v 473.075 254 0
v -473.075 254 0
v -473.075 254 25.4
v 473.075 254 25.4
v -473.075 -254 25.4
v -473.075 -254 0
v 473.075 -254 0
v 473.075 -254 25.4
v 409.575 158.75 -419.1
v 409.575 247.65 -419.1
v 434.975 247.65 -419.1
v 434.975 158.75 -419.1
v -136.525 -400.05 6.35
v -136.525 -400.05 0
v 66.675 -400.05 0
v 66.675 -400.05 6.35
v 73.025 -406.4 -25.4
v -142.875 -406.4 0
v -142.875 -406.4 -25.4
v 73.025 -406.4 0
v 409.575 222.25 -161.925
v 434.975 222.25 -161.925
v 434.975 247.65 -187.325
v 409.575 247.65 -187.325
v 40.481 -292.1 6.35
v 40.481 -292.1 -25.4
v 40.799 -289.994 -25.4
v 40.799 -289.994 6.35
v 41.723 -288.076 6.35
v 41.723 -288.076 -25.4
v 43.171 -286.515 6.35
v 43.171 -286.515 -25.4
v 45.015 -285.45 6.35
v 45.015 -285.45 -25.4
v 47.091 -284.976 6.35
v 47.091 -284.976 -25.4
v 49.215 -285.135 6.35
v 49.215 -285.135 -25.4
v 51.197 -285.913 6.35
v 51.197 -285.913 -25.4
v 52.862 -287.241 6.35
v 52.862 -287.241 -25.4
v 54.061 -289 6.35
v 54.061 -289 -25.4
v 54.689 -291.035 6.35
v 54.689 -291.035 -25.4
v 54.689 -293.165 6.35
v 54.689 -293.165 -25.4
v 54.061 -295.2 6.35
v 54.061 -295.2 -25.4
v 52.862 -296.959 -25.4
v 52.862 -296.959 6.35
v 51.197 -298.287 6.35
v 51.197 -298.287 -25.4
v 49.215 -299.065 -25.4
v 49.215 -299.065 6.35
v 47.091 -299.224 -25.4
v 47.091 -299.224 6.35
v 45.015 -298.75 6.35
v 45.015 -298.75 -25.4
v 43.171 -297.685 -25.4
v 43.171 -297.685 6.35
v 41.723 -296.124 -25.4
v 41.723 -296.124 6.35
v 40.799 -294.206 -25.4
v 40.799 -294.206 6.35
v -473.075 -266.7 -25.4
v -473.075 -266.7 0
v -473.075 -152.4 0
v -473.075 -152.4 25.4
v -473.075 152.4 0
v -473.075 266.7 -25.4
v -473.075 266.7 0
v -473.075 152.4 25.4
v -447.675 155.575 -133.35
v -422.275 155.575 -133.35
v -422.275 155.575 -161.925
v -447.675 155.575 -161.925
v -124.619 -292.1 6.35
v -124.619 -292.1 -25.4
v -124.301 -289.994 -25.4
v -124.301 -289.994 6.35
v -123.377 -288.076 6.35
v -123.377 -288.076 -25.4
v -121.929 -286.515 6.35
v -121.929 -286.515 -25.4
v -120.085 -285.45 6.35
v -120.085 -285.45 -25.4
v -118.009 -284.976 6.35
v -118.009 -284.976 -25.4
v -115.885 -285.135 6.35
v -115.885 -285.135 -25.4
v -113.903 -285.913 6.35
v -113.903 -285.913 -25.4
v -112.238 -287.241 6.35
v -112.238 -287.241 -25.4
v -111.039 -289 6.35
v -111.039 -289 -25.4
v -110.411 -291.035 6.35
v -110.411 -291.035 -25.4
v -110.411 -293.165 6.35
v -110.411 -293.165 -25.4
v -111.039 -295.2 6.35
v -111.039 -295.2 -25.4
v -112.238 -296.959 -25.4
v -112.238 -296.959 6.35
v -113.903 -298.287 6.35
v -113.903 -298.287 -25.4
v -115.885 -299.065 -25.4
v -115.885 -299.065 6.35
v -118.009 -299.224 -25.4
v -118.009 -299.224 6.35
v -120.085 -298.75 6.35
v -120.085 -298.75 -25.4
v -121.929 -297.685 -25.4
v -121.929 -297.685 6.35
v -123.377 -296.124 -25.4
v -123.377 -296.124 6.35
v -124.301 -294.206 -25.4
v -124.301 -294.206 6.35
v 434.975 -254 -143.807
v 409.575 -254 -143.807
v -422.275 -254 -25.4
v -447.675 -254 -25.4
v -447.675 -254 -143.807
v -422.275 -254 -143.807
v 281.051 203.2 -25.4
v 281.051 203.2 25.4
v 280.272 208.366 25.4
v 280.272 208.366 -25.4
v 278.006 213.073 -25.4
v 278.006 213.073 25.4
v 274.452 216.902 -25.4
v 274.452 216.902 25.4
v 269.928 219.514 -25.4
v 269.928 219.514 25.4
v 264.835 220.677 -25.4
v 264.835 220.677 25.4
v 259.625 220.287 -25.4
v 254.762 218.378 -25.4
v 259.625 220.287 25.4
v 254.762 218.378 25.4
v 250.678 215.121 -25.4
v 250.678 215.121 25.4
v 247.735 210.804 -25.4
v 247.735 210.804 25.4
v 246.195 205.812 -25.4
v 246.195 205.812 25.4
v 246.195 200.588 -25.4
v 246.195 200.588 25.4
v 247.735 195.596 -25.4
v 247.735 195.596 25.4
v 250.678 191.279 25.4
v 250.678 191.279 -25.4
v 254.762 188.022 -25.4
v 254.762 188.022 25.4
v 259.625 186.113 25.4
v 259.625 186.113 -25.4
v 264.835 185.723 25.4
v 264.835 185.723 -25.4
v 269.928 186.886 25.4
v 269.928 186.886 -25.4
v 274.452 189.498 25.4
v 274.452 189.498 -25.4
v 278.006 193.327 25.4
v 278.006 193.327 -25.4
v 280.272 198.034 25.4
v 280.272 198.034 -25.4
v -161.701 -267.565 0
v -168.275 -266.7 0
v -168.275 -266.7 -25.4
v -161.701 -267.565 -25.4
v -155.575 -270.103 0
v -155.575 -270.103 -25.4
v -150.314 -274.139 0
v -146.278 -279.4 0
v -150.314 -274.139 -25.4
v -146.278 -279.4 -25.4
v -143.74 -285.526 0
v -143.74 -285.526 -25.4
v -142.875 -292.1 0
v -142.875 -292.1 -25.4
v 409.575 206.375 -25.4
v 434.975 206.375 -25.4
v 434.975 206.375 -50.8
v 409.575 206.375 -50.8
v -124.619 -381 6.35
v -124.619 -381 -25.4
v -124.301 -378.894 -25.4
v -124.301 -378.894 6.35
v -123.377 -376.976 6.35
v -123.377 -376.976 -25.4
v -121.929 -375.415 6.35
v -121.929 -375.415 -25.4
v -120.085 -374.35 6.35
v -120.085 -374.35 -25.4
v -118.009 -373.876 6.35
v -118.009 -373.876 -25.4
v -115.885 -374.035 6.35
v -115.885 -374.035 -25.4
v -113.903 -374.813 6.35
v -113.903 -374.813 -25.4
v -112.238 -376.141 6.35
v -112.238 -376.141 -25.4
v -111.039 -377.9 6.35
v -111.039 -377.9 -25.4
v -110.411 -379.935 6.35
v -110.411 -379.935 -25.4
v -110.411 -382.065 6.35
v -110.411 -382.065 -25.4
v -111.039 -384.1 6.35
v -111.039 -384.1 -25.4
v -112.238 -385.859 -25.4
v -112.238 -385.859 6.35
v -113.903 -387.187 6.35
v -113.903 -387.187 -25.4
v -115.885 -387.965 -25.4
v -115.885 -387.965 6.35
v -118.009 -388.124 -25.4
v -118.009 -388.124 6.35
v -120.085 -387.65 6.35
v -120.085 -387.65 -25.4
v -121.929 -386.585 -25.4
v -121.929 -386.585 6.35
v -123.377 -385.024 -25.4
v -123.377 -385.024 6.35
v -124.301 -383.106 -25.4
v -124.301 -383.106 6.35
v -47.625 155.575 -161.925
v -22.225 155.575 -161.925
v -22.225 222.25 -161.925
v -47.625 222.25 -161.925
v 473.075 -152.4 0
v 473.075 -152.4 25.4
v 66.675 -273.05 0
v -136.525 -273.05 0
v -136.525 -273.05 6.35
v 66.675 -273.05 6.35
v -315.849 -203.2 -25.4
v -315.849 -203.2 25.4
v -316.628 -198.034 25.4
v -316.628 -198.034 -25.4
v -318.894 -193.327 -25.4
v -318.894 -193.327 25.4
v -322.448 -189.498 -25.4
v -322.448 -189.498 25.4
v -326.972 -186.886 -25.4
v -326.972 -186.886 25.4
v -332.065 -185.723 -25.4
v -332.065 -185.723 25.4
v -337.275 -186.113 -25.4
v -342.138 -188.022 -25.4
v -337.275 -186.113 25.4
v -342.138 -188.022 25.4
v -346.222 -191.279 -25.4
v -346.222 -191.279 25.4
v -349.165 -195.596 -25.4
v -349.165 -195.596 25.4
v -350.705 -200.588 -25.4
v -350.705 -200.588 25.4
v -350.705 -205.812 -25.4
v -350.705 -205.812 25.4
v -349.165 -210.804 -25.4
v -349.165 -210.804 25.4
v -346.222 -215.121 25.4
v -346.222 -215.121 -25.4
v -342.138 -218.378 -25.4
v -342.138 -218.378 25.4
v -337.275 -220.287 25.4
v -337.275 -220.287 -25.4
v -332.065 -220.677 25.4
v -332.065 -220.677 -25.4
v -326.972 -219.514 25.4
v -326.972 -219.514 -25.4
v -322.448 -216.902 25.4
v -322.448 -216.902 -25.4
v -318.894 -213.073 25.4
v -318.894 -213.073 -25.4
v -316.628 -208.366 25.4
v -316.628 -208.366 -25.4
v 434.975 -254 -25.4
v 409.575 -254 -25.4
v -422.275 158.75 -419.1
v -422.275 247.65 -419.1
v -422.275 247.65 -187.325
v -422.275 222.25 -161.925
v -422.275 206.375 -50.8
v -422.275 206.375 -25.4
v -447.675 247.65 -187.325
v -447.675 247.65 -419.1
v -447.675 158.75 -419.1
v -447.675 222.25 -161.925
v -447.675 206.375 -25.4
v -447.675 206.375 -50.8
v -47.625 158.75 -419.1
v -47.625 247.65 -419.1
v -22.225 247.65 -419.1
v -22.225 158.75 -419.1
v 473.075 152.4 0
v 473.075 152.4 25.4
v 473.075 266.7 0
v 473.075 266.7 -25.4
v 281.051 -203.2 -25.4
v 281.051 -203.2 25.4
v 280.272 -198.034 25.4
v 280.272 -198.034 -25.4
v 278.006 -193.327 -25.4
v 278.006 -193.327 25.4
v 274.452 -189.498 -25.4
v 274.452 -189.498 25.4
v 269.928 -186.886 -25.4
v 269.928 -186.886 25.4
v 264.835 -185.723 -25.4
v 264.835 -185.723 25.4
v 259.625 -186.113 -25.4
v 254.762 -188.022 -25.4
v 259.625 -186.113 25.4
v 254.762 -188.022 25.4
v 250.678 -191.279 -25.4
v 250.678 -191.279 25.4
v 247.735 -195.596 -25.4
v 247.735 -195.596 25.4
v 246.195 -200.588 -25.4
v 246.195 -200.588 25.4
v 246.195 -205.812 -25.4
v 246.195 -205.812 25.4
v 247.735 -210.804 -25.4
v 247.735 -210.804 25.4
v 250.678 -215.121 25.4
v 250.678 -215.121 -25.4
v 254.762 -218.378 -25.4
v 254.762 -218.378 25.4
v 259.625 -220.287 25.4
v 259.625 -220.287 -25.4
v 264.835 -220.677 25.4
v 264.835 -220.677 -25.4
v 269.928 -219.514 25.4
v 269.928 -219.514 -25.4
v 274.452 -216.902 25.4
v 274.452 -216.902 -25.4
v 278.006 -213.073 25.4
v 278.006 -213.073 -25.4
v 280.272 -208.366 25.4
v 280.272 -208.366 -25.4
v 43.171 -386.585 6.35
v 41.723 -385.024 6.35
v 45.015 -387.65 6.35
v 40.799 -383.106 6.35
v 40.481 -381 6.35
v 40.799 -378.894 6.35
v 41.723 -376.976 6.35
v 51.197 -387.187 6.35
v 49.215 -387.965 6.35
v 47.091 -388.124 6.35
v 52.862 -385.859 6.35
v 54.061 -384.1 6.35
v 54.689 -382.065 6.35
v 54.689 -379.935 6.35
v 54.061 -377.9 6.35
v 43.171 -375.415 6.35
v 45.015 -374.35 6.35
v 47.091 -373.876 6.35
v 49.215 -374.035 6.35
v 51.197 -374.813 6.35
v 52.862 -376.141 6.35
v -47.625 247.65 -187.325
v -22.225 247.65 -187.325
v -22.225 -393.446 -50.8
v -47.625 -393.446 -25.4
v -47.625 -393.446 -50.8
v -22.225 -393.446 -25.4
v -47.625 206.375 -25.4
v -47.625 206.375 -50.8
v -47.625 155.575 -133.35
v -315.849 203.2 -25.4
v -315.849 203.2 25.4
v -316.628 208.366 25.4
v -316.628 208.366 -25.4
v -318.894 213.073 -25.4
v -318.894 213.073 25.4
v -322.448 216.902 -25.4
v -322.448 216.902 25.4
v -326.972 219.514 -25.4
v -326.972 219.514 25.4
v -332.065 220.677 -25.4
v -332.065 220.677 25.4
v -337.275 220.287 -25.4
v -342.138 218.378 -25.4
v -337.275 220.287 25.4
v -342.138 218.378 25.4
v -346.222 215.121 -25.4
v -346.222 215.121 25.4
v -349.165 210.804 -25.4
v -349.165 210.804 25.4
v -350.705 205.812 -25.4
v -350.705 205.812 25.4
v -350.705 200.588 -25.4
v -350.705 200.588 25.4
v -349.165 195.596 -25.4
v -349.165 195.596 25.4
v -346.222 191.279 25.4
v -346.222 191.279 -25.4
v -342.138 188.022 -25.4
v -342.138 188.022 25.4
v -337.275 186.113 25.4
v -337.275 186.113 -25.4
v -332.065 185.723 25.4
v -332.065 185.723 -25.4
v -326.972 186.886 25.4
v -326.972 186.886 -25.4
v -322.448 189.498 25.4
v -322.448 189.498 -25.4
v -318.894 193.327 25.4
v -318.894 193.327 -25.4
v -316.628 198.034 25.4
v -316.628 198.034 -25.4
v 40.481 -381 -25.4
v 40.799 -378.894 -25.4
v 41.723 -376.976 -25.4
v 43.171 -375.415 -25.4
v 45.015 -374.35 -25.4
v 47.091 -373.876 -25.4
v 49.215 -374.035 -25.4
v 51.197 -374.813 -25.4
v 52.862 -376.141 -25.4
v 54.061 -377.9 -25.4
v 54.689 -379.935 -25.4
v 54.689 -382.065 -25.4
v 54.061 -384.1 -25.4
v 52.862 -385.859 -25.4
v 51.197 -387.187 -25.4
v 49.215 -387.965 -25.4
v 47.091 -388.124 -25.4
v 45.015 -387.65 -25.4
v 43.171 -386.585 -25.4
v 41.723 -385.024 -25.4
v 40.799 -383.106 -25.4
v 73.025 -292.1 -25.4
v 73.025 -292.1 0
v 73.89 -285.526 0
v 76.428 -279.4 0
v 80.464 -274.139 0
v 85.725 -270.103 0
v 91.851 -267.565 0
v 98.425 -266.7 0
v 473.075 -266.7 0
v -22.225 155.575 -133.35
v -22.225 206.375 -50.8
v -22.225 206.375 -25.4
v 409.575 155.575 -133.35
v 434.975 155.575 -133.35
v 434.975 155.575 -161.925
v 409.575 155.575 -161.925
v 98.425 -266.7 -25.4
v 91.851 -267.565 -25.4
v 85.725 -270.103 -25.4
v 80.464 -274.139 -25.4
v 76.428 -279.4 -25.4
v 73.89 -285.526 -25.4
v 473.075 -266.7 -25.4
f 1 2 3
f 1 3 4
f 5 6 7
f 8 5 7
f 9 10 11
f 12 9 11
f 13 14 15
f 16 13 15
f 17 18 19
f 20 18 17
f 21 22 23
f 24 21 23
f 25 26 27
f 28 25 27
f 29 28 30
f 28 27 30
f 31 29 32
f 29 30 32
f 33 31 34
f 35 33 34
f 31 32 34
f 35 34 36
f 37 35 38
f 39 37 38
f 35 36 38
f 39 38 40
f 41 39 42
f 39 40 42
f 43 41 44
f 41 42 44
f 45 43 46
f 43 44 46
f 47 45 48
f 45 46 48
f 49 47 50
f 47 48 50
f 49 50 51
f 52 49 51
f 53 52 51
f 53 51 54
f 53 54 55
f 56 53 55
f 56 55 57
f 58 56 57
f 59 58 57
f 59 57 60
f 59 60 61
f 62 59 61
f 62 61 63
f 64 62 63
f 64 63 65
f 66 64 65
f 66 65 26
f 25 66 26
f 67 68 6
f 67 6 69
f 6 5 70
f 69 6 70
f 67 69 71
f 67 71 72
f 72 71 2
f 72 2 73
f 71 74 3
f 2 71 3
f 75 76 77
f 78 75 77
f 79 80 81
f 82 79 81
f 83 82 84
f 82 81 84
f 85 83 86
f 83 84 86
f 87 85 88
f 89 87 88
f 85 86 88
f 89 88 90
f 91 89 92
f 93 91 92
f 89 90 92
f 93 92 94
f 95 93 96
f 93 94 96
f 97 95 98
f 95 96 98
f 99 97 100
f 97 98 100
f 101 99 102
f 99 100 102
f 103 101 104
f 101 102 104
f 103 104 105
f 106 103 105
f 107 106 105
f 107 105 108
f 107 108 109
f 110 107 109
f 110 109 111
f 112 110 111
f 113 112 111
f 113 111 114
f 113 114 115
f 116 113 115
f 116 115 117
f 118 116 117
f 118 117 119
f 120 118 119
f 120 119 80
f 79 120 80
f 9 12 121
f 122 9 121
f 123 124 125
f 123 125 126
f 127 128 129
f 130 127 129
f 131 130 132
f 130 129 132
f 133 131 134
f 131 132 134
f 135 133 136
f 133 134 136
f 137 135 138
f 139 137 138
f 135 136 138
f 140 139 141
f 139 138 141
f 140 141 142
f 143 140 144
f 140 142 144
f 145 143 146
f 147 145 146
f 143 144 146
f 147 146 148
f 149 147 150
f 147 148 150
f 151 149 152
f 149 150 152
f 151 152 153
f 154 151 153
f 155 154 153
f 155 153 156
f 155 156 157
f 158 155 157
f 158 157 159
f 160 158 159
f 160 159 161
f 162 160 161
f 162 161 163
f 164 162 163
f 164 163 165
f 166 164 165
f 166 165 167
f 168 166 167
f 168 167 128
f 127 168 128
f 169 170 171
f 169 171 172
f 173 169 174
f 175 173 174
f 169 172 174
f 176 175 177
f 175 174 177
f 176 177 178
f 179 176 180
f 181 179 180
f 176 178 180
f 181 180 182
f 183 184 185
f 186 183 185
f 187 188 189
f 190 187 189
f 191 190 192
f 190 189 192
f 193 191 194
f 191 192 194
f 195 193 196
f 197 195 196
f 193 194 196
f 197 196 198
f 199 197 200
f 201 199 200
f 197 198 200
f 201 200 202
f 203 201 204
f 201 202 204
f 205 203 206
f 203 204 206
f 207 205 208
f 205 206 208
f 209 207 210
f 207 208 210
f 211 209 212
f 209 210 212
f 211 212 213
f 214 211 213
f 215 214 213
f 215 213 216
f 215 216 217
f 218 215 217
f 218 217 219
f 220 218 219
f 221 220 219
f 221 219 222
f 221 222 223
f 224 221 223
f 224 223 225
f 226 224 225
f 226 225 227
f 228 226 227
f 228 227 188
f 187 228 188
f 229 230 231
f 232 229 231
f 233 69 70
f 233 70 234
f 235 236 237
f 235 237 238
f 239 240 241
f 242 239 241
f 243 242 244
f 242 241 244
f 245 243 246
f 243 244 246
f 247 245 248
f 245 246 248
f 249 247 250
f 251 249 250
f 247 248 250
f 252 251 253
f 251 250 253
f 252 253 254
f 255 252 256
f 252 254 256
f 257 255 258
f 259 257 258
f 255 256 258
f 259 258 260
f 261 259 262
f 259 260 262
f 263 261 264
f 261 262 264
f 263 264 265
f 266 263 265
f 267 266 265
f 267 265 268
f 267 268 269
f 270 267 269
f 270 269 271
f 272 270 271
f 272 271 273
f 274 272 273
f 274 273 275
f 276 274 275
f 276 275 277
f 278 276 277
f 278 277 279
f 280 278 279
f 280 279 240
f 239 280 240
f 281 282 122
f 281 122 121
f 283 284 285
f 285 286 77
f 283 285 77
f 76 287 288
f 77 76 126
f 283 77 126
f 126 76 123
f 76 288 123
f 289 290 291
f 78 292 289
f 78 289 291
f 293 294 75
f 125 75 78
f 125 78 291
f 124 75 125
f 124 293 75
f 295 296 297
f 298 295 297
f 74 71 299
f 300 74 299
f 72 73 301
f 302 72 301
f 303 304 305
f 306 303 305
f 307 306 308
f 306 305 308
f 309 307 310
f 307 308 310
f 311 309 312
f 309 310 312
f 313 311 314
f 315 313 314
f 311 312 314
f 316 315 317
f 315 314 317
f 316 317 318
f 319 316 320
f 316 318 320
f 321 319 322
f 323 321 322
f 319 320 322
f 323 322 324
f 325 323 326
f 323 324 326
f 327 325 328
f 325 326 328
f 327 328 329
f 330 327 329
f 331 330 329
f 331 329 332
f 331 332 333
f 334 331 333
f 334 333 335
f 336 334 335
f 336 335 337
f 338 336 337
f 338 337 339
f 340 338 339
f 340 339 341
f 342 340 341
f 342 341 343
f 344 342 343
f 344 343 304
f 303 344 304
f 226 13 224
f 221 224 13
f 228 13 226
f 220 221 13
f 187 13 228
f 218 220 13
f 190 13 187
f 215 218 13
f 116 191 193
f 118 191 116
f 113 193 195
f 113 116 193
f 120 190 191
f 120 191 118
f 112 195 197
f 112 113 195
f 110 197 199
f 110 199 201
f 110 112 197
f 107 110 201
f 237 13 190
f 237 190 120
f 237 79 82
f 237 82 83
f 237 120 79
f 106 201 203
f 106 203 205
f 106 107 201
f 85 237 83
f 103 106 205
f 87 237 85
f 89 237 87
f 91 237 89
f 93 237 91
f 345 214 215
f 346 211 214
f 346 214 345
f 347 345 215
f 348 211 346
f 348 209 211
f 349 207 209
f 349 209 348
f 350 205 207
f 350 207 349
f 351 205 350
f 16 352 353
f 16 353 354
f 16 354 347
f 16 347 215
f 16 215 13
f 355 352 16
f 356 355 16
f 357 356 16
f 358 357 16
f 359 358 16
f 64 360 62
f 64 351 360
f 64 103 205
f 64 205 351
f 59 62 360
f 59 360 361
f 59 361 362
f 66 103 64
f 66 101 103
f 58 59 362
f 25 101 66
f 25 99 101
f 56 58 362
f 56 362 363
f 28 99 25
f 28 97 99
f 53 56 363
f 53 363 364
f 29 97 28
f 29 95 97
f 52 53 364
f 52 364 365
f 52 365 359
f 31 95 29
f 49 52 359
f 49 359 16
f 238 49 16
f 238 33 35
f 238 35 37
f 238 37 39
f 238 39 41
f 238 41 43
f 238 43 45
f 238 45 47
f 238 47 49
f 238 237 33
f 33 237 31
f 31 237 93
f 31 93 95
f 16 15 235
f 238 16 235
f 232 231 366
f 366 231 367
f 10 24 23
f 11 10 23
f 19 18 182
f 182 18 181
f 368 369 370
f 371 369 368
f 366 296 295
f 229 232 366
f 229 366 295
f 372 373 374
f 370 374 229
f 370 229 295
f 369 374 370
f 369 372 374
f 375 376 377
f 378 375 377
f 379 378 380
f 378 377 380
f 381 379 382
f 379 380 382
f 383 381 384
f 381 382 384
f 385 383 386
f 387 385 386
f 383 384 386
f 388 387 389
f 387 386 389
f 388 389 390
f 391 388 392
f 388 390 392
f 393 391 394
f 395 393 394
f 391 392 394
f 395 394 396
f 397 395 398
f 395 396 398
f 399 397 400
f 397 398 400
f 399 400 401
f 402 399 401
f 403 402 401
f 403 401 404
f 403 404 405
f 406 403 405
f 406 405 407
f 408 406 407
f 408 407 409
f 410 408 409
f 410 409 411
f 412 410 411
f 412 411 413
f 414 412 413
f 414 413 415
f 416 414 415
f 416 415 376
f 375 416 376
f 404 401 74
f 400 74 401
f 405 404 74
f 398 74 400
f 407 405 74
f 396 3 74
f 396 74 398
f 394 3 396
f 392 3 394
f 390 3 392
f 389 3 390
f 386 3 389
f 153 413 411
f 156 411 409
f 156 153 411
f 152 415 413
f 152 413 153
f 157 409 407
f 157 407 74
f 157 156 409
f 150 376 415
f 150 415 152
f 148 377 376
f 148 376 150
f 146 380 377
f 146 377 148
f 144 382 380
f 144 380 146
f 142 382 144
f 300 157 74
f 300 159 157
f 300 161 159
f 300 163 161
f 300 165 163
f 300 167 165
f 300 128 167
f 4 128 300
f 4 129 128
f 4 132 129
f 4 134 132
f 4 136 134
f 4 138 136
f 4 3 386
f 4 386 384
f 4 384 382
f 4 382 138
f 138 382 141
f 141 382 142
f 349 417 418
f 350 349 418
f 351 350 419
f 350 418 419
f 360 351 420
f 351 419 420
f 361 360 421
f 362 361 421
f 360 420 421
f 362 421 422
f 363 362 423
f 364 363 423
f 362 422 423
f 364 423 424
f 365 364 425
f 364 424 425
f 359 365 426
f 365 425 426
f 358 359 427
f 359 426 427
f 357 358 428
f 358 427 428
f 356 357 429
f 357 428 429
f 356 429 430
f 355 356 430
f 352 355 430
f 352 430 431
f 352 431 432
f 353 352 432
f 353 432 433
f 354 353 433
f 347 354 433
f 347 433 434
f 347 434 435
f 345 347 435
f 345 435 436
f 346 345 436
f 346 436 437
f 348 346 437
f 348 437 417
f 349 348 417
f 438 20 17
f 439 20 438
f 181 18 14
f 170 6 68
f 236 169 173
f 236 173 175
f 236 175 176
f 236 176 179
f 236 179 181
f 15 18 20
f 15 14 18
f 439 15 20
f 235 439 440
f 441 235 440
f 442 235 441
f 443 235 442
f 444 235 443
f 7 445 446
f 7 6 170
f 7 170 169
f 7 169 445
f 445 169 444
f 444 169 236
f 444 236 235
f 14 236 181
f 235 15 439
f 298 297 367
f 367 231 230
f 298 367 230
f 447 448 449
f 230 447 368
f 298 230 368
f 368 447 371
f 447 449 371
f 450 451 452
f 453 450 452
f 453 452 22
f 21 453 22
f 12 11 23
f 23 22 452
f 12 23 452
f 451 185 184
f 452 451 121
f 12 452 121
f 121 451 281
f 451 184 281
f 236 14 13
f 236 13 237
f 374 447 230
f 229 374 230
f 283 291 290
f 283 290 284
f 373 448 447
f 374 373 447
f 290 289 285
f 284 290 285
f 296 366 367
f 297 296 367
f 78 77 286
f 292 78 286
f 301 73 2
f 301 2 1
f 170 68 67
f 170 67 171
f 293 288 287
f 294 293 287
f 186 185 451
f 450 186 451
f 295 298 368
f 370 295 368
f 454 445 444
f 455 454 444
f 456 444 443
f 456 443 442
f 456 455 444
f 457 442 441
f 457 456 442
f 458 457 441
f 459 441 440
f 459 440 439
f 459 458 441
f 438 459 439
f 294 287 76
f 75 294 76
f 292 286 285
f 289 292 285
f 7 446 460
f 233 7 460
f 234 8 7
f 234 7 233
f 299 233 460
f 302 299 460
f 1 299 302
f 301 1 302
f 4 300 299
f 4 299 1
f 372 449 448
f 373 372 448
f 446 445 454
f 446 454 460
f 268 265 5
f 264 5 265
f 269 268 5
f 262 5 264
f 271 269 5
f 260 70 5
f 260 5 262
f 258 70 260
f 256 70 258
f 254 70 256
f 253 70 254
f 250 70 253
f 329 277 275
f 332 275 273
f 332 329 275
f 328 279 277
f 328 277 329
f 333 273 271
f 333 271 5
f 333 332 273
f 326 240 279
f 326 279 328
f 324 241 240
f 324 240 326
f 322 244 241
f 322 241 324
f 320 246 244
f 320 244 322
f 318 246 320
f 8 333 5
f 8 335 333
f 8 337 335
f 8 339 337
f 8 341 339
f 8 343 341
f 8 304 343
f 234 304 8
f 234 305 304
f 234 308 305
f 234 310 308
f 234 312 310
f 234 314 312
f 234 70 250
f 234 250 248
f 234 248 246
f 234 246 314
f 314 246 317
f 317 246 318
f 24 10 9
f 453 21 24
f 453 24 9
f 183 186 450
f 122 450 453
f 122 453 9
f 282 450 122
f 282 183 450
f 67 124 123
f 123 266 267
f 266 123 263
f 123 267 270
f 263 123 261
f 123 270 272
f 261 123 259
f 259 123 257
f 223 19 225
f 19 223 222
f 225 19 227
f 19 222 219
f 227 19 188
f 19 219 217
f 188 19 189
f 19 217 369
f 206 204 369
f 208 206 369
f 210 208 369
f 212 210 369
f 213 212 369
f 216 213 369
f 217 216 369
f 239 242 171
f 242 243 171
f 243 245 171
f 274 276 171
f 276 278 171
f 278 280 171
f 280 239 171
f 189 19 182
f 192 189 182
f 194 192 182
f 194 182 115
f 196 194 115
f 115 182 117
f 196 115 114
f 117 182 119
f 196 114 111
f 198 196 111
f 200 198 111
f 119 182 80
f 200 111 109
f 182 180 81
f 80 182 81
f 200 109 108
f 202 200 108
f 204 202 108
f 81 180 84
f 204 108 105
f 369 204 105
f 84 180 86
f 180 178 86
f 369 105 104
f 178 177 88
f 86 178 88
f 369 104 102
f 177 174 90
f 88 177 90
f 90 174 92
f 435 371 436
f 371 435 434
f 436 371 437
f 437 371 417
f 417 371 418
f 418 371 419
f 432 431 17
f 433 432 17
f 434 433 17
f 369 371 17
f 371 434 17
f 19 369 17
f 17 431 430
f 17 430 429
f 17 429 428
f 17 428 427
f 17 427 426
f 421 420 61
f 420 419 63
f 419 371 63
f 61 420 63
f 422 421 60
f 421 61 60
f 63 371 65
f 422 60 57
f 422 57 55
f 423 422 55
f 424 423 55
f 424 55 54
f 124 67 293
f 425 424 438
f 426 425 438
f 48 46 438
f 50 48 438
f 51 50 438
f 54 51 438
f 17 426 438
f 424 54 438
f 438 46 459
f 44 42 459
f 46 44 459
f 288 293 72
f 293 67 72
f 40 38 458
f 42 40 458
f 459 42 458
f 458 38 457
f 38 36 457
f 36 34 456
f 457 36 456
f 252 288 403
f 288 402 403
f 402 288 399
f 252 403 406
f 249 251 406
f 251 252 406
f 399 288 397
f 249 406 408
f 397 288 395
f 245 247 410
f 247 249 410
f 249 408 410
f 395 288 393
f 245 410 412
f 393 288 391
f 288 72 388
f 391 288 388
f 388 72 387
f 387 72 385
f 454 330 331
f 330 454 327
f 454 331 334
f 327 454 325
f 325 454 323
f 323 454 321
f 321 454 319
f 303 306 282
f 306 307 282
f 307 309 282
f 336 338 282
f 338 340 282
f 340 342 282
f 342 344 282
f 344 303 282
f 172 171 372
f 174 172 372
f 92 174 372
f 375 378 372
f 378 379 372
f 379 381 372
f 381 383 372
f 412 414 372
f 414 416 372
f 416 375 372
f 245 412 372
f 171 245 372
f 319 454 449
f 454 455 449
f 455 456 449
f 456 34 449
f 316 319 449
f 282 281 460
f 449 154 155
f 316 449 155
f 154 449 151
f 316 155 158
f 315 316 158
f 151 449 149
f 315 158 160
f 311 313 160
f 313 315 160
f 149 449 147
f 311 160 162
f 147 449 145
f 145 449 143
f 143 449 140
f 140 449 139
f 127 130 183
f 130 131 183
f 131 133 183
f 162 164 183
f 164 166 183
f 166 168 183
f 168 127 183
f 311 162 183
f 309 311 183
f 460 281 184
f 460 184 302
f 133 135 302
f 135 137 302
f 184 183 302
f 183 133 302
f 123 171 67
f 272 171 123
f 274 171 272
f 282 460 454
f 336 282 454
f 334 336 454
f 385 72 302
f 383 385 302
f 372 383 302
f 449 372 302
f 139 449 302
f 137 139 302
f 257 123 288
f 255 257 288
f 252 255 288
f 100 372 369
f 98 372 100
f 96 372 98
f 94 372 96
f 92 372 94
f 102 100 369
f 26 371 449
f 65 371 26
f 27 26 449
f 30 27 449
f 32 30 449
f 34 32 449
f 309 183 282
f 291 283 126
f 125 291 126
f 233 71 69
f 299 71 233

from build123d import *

# Parameters (mm, degrees)
F0_W      = 946.15
F0_H      = 533.4
F1_DEPTH  = 25.4
F2_W      = 215.9
F2_H      = 139.7
F3_DEPTH  = 25.4
F4_R      = 25.4
F5_W      = 946.15
F5_H      = 101.6
F6_DEPTH  = 25.4
F7_R      = 17.526
F8_DEPTH  = 50.801
F9_W      = 203.2
F9_H      = 127
F10_DEPTH = 6.35
F12_D     = 14.2875
F13_W     = 25.4
F13_H     = 501.65
F13_H_2   = 641.096
F14_DEPTH = 393.7
F16_DEPTH = 908.051
F18_DEPTH = 908.051


with BuildPart() as f1:
    # F0 (on Top) → F1 (new body)
    with BuildSketch(Plane.XY):
        Rectangle(F0_W, F0_H)
    extrude(amount=-F1_DEPTH)

    # F2 (on face) → F3 (join)
    with BuildSketch(Plane.XY):
        with Locations((-34.925, -336.55)):
            Rectangle(F2_W, F2_H)
    extrude(amount=-F3_DEPTH)

    # F4
    f4_edges = [f1.edges().sort_by_distance(p)[0] for p in [
        (-142.875, -266.7, -12.7),
        (73.025, -266.7, -12.7),
    ]]
    fillet(f4_edges, radius=F4_R)

    # F5 (on face) → F6 (join)
    with BuildSketch(Plane.XY):
        with Locations((0, 203.2)):
            Rectangle(F5_W, F5_H)
        with Locations((0, -203.2)):
            Rectangle(F5_W, F5_H)
    extrude(amount=F6_DEPTH)

    # F7 (on face) → F8 (cut, through all)
    with BuildSketch(Plane.XY.offset(25.4)):
        with Locations((-333.375, 203.2)):
            Circle(F7_R)
        with Locations((-333.375, -203.2)):
            Circle(F7_R)
        with Locations((263.525, -203.2)):
            Circle(F7_R)
        with Locations((263.525, 203.2)):
            Circle(F7_R)
    extrude(amount=-F8_DEPTH, mode=Mode.SUBTRACT)

    # F9 (on face) → F10 (join)
    with BuildSketch(Plane.XY):
        with Locations((-34.925, -336.55)):
            Rectangle(F9_W, F9_H)
    extrude(amount=F10_DEPTH)

    # F12 (through all)
    with Locations(Plane.XY.offset(6.35)):
        with Locations((-117.475, -292.1), (-117.475, -381), (47.625, -292.1), (47.625, -381)):
            Hole(F12_D / 2)

    # F13 (on face) → F14 (join)
    with BuildSketch(Plane(origin=(0, 0, -25.4), x_dir=(1, 0, 0), z_dir=(0, 0, -1))):
        with Locations((422.275, 3.175)):
            Rectangle(F13_W, F13_H)
        with Locations((-34.925, 72.898)):
            Rectangle(F13_W, F13_H_2)
        with Locations((-434.975, 3.175)):
            Rectangle(F13_W, F13_H)
    extrude(amount=F14_DEPTH)

    # F15 (on face) → F16 (cut, through all)
    with BuildSketch(Plane.YZ.offset(434.975)):
        Polygon((158.75, -419.1), (-393.446, -50.8), (-393.446, -419.1), align=None)
    extrude(amount=-F16_DEPTH, mode=Mode.SUBTRACT)

    # F17 (on face) → F18 (cut, through all)
    with BuildSketch(Plane.YZ.offset(434.975)):
        Polygon((155.575, -133.35), (155.575, -161.925), (222.25, -161.925), (247.65, -187.325), (247.65, -25.4), (206.375, -25.4), (206.375, -50.8), align=None)
    extrude(amount=-F18_DEPTH, mode=Mode.SUBTRACT)


solid = f1.part
